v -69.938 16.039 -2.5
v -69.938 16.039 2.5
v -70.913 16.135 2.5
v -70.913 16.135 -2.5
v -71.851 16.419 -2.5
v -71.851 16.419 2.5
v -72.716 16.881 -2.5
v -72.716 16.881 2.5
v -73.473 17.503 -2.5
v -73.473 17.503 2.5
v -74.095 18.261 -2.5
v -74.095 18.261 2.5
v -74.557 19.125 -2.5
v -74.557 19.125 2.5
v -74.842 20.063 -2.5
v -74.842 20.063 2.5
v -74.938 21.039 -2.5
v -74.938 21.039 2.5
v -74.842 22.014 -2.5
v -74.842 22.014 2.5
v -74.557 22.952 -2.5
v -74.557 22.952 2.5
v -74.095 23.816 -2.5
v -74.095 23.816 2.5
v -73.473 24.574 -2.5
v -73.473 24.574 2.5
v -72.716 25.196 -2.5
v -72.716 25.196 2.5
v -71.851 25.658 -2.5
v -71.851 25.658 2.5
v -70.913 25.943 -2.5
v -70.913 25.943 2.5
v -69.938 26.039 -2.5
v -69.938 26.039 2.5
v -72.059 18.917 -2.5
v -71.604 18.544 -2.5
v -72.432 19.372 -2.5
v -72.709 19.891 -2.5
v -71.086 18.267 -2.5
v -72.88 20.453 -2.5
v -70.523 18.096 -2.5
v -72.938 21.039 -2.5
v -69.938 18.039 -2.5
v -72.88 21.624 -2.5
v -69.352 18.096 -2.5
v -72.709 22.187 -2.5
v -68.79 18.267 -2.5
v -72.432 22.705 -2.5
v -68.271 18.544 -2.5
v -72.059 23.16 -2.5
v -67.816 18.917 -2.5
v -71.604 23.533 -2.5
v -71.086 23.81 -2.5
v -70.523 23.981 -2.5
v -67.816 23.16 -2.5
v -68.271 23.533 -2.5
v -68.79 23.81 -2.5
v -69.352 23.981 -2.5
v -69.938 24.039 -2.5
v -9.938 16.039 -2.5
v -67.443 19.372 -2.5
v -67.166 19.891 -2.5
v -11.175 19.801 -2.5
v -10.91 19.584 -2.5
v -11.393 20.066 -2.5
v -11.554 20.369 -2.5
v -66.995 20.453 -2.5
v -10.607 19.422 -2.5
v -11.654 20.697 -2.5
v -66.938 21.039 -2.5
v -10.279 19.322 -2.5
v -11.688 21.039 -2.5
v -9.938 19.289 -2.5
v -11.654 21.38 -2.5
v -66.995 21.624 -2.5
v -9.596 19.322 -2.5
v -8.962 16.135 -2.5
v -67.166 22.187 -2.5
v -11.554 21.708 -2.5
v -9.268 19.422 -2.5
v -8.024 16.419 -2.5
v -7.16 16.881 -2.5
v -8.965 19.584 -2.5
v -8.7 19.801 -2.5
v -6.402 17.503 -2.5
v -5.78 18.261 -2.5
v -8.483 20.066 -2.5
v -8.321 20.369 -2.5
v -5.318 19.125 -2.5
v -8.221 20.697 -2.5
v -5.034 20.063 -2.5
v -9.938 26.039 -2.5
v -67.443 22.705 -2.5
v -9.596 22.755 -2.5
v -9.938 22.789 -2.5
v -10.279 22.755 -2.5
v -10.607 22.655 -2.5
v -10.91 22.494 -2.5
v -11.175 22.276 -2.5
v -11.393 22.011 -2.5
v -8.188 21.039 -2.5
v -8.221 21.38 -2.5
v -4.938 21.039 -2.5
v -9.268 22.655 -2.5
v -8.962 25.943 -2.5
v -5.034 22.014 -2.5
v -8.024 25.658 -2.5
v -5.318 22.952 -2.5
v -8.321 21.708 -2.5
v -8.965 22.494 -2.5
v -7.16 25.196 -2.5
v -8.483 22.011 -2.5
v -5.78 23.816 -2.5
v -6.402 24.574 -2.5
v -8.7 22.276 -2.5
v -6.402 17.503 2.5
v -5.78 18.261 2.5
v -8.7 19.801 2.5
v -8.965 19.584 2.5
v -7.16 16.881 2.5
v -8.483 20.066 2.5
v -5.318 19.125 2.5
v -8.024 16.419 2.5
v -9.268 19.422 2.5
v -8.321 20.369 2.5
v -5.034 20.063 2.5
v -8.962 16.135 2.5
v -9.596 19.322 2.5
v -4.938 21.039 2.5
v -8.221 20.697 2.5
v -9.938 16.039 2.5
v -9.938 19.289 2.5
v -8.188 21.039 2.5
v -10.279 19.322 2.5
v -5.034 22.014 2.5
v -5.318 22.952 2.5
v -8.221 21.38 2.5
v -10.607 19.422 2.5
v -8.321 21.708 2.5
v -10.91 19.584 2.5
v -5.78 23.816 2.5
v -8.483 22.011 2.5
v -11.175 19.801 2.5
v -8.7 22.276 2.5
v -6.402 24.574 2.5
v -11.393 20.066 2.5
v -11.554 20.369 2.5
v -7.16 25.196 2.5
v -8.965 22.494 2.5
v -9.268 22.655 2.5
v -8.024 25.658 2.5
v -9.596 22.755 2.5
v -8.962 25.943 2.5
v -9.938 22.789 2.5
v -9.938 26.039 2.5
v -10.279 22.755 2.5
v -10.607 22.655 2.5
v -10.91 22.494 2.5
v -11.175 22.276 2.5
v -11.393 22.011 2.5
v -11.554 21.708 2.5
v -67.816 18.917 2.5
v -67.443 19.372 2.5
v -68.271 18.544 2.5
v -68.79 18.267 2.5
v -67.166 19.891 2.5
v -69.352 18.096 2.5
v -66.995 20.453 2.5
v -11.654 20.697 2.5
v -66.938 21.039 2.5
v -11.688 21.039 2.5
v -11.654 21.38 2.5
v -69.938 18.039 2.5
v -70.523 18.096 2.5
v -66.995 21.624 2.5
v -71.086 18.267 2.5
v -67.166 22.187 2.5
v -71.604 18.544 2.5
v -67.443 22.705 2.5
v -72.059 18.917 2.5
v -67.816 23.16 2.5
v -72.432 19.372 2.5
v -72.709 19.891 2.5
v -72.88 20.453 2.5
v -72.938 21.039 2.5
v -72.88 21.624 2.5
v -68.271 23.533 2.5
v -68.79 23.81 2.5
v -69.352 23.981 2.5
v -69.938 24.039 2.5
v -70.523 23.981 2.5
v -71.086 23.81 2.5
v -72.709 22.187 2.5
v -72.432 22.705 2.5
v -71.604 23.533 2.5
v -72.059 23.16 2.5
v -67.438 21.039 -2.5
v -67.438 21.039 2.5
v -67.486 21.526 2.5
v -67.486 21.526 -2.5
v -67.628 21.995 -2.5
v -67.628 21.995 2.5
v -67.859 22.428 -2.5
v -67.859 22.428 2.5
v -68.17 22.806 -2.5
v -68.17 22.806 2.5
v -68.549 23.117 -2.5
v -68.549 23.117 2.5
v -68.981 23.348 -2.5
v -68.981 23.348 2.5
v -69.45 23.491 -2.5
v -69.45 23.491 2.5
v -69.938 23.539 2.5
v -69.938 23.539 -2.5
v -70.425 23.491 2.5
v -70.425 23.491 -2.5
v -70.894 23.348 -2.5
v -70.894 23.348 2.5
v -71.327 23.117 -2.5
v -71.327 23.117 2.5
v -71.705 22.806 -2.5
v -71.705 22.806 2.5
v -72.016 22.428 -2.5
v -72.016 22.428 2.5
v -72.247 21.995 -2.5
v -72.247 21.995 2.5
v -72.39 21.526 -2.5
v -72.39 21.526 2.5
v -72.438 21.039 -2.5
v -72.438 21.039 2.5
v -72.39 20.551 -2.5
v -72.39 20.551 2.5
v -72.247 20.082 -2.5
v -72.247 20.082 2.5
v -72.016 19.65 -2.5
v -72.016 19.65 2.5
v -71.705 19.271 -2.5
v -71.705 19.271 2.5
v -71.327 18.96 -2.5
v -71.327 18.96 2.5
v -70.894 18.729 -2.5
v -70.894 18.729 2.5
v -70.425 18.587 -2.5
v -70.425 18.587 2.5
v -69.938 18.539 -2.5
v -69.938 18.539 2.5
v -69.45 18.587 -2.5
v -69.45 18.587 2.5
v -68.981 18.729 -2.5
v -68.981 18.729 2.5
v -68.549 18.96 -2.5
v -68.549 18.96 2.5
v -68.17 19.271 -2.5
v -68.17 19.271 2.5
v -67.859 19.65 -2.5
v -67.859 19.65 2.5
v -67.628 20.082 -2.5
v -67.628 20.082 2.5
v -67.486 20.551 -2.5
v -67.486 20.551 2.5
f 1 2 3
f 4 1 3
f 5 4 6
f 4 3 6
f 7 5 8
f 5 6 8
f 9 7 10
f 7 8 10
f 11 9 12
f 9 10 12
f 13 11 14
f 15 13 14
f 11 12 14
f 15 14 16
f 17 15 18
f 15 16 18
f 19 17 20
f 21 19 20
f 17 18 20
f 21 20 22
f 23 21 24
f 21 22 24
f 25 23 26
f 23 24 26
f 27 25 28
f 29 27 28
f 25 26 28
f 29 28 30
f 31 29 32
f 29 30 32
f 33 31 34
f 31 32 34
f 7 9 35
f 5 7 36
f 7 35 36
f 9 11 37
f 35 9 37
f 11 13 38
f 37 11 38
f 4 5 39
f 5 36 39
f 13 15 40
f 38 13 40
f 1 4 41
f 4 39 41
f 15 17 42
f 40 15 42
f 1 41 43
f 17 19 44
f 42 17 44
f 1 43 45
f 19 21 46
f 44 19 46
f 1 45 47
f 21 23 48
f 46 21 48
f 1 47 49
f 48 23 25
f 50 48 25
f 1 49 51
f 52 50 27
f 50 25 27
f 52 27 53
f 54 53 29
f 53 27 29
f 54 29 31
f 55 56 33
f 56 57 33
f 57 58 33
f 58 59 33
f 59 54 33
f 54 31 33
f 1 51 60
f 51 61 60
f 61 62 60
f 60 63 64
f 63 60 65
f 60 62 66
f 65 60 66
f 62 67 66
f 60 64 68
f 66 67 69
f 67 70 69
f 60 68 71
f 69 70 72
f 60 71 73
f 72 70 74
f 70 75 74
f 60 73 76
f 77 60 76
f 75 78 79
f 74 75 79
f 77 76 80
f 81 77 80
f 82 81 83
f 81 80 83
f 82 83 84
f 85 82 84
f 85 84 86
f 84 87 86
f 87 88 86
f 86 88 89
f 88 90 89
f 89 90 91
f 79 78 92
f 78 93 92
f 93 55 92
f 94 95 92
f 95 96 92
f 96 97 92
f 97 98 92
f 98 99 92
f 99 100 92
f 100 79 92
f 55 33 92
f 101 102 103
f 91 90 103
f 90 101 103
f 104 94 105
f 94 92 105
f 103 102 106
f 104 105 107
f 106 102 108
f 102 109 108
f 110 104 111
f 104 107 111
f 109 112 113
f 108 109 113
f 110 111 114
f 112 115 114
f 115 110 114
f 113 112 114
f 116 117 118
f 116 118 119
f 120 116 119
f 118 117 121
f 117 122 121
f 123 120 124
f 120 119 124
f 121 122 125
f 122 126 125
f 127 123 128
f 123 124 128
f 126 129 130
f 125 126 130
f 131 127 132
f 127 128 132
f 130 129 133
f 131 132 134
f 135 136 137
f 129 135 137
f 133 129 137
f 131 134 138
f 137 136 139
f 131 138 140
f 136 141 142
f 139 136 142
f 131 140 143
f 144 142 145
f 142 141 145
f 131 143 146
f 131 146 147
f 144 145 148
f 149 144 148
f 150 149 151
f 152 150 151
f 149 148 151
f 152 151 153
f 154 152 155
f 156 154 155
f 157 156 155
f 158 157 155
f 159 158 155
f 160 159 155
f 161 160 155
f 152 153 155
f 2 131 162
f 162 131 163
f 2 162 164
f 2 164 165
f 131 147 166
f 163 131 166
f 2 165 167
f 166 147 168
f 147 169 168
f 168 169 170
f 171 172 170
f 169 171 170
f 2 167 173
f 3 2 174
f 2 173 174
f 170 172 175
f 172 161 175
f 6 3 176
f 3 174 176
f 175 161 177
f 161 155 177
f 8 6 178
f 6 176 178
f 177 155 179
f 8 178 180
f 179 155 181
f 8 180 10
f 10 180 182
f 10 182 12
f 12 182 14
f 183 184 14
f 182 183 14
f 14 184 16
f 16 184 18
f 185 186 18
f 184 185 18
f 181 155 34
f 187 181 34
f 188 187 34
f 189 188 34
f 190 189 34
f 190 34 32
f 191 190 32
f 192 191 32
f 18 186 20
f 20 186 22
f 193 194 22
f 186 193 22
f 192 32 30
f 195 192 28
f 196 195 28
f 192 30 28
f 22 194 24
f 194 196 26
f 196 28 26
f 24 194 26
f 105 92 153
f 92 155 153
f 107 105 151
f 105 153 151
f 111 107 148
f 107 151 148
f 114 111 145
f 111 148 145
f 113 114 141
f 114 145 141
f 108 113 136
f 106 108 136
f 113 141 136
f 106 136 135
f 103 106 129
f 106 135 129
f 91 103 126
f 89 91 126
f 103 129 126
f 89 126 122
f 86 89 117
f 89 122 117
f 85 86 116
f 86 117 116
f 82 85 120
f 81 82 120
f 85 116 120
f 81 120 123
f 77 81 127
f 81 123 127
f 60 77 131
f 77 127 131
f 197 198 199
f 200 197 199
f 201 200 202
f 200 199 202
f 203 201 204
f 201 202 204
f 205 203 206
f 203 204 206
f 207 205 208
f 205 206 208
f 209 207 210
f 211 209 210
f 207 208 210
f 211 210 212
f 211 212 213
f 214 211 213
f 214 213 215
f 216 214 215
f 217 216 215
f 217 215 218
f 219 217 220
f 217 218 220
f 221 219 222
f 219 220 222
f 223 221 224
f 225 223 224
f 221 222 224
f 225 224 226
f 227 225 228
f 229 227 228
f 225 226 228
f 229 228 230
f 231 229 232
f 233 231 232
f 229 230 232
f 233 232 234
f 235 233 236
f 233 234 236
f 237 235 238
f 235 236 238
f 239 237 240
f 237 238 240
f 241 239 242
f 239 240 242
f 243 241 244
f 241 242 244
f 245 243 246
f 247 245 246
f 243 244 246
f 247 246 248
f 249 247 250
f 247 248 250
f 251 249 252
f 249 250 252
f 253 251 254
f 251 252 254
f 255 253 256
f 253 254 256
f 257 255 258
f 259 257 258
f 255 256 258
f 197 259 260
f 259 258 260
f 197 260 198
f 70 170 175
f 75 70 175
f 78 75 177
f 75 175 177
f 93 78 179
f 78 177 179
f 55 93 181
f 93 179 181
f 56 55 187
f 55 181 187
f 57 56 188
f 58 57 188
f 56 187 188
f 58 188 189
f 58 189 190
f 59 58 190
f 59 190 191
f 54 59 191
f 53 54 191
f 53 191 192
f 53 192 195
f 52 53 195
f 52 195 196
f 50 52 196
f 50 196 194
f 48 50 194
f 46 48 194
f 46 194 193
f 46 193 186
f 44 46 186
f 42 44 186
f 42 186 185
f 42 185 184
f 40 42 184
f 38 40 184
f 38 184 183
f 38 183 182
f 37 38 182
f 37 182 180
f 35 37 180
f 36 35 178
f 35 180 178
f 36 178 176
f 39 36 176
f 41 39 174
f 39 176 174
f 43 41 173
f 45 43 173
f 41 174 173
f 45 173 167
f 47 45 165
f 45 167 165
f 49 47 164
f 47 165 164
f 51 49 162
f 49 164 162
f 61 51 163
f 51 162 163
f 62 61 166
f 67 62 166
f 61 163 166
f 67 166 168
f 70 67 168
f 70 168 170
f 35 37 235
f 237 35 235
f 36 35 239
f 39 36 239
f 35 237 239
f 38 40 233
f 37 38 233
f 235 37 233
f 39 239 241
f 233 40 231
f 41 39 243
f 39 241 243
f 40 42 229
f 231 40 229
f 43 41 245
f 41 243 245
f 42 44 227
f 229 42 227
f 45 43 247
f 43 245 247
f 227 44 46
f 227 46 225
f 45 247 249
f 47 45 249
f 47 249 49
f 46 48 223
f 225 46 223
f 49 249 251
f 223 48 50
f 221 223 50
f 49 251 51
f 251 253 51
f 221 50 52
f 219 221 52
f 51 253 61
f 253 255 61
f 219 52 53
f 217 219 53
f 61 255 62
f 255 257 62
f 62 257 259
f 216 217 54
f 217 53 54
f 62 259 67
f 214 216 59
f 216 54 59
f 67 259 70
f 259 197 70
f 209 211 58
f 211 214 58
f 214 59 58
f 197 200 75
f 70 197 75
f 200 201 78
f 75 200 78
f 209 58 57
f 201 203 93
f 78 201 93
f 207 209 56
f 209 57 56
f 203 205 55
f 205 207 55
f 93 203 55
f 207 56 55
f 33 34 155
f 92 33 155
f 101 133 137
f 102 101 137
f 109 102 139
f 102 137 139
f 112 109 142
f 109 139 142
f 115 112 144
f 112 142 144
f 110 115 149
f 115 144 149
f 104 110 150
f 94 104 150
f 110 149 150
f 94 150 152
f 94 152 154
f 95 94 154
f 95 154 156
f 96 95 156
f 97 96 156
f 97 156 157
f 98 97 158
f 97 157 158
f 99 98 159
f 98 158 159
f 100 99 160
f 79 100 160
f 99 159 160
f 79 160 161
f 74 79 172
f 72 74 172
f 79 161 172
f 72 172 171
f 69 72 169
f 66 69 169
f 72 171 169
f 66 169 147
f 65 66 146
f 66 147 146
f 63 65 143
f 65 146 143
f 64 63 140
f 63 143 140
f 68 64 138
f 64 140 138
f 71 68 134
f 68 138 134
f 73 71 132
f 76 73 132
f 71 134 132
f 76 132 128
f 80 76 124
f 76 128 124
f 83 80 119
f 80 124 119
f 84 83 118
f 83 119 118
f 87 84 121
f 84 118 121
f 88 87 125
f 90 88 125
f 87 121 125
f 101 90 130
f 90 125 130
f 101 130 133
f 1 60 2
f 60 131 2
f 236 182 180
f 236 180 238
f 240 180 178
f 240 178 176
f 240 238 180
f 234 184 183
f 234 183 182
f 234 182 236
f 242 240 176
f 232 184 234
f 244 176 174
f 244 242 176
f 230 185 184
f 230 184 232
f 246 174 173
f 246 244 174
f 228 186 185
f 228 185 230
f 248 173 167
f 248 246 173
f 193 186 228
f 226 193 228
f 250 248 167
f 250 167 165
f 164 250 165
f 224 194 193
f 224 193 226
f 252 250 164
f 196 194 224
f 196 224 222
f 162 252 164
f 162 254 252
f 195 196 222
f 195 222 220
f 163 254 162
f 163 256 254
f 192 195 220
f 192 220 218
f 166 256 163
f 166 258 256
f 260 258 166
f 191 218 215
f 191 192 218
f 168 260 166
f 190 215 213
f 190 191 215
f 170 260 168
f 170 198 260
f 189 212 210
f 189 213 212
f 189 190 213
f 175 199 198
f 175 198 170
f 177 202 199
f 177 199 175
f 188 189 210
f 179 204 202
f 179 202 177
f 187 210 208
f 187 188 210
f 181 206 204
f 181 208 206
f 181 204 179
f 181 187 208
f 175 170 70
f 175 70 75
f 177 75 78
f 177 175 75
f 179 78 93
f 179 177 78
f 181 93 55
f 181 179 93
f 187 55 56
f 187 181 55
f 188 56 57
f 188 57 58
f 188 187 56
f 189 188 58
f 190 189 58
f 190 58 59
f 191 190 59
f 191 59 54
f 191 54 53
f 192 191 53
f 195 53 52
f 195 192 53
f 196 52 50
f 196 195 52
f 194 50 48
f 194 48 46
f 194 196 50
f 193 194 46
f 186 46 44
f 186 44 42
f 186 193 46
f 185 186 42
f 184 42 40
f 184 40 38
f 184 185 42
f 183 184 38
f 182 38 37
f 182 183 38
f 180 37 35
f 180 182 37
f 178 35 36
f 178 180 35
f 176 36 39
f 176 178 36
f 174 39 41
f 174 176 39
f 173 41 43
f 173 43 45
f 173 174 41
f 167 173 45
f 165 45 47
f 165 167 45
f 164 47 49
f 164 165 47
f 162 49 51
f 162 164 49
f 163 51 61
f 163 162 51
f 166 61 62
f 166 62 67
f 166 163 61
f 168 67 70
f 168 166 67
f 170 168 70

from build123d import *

# Parameters (mm, degrees)
SKETCH_1_R          = 3
EXTRUDE_1_DEPTH     = 2.5
EXTRUDE_START       = -5
SKETCH_2_R          = 3
EXTRUDE_2_DEPTH     = 5
SKETCH_3_R          = 1.75
CUT_EXTRUDE_1_DEPTH = 5
SKETCH_4_R          = 3
CUT_EXTRUDE_2_DEPTH = 10
SKETCH_5_R          = 3
EXTRUDE_4_DEPTH     = 5
SKETCH_6_R          = 1.75
CUT_EXTRUDE_3_DEPTH = 5
SKETCH_7_R          = 3
EXTRUDE_5_DEPTH     = 5
SKETCH_8_R          = 2.5
CUT_EXTRUDE_4_DEPTH = 5


with BuildPart() as part:
    # 草图1 → 凸台-拉伸1 (new, symmetric)
    with BuildSketch(Plane.XY):
        with BuildLine():
            Line((-69.937695792, 26.038617485), (-9.937695792, 26.038617485))
            ThreePointArc((-9.937695792, 26.038617485), (-4.937695792, 21.038617485), (-9.937695792, 16.038617485))
            Line((-9.937695792, 16.038617485), (-69.937695792, 16.038617485))
            ThreePointArc((-69.937695792, 16.038617485), (-74.937695792, 21.038617485), (-69.937695792, 26.038617485))
        make_face()
        with Locations((-69.937695792, 21.038617485)):
            Circle(SKETCH_1_R, mode=Mode.SUBTRACT)
        with Locations((-9.937695792, 21.038617485)):
            Circle(SKETCH_1_R, mode=Mode.SUBTRACT)
    extrude(amount=EXTRUDE_1_DEPTH, both=True)

    # 草图2 → 凸台-拉伸2 (add)
    with BuildSketch(Plane.XY.offset(2.5).offset(EXTRUDE_START)):
        with Locations((-69.937695792, 21.038617485)):
            Circle(SKETCH_2_R)
    extrude(amount=EXTRUDE_2_DEPTH)

    # 草图3 → 切除-拉伸1 (cut)
    with BuildSketch(Plane.XY.offset(2.5)):
        with Locations((-69.937695792, 21.038617485)):
            Circle(SKETCH_3_R)
    extrude(amount=-CUT_EXTRUDE_1_DEPTH, mode=Mode.SUBTRACT)

    # 草图4 → 切除-拉伸2 (cut)
    with BuildSketch(Plane.XY.offset(2.5)):
        with Locations((-69.937695792, 21.038617485)):
            Circle(SKETCH_4_R)
    extrude(amount=-CUT_EXTRUDE_2_DEPTH, mode=Mode.SUBTRACT)

    # 草图5 → 凸台-拉伸4 (add)
    with BuildSketch(Plane.XY.offset(2.5).offset(EXTRUDE_START)):
        with Locations((-9.937695792, 21.038617485)):
            Circle(SKETCH_5_R)
    extrude(amount=EXTRUDE_4_DEPTH)

    # 草图6 → 切除-拉伸3 (cut)
    with BuildSketch(Plane.XY.offset(2.5)):
        with Locations((-9.937695792, 21.038617485)):
            Circle(SKETCH_6_R)
    extrude(amount=-CUT_EXTRUDE_3_DEPTH, mode=Mode.SUBTRACT)


with BuildPart() as body_2:
    # 草图7 → 凸台-拉伸5 (new body)
    with BuildSketch(Plane.XY.offset(2.5)):
        with Locations((-69.937695792, 21.038617485)):
            Circle(SKETCH_7_R)
    extrude(amount=-EXTRUDE_5_DEPTH)

    # 草图8 → 切除-拉伸4 (cut)
    with BuildSketch(Plane.XY.offset(2.5)):
        with Locations((-69.937695792, 21.038617485)):
            Circle(SKETCH_8_R)
    extrude(amount=-CUT_EXTRUDE_4_DEPTH, mode=Mode.SUBTRACT)


solid = Compound([part.part, body_2.part])
